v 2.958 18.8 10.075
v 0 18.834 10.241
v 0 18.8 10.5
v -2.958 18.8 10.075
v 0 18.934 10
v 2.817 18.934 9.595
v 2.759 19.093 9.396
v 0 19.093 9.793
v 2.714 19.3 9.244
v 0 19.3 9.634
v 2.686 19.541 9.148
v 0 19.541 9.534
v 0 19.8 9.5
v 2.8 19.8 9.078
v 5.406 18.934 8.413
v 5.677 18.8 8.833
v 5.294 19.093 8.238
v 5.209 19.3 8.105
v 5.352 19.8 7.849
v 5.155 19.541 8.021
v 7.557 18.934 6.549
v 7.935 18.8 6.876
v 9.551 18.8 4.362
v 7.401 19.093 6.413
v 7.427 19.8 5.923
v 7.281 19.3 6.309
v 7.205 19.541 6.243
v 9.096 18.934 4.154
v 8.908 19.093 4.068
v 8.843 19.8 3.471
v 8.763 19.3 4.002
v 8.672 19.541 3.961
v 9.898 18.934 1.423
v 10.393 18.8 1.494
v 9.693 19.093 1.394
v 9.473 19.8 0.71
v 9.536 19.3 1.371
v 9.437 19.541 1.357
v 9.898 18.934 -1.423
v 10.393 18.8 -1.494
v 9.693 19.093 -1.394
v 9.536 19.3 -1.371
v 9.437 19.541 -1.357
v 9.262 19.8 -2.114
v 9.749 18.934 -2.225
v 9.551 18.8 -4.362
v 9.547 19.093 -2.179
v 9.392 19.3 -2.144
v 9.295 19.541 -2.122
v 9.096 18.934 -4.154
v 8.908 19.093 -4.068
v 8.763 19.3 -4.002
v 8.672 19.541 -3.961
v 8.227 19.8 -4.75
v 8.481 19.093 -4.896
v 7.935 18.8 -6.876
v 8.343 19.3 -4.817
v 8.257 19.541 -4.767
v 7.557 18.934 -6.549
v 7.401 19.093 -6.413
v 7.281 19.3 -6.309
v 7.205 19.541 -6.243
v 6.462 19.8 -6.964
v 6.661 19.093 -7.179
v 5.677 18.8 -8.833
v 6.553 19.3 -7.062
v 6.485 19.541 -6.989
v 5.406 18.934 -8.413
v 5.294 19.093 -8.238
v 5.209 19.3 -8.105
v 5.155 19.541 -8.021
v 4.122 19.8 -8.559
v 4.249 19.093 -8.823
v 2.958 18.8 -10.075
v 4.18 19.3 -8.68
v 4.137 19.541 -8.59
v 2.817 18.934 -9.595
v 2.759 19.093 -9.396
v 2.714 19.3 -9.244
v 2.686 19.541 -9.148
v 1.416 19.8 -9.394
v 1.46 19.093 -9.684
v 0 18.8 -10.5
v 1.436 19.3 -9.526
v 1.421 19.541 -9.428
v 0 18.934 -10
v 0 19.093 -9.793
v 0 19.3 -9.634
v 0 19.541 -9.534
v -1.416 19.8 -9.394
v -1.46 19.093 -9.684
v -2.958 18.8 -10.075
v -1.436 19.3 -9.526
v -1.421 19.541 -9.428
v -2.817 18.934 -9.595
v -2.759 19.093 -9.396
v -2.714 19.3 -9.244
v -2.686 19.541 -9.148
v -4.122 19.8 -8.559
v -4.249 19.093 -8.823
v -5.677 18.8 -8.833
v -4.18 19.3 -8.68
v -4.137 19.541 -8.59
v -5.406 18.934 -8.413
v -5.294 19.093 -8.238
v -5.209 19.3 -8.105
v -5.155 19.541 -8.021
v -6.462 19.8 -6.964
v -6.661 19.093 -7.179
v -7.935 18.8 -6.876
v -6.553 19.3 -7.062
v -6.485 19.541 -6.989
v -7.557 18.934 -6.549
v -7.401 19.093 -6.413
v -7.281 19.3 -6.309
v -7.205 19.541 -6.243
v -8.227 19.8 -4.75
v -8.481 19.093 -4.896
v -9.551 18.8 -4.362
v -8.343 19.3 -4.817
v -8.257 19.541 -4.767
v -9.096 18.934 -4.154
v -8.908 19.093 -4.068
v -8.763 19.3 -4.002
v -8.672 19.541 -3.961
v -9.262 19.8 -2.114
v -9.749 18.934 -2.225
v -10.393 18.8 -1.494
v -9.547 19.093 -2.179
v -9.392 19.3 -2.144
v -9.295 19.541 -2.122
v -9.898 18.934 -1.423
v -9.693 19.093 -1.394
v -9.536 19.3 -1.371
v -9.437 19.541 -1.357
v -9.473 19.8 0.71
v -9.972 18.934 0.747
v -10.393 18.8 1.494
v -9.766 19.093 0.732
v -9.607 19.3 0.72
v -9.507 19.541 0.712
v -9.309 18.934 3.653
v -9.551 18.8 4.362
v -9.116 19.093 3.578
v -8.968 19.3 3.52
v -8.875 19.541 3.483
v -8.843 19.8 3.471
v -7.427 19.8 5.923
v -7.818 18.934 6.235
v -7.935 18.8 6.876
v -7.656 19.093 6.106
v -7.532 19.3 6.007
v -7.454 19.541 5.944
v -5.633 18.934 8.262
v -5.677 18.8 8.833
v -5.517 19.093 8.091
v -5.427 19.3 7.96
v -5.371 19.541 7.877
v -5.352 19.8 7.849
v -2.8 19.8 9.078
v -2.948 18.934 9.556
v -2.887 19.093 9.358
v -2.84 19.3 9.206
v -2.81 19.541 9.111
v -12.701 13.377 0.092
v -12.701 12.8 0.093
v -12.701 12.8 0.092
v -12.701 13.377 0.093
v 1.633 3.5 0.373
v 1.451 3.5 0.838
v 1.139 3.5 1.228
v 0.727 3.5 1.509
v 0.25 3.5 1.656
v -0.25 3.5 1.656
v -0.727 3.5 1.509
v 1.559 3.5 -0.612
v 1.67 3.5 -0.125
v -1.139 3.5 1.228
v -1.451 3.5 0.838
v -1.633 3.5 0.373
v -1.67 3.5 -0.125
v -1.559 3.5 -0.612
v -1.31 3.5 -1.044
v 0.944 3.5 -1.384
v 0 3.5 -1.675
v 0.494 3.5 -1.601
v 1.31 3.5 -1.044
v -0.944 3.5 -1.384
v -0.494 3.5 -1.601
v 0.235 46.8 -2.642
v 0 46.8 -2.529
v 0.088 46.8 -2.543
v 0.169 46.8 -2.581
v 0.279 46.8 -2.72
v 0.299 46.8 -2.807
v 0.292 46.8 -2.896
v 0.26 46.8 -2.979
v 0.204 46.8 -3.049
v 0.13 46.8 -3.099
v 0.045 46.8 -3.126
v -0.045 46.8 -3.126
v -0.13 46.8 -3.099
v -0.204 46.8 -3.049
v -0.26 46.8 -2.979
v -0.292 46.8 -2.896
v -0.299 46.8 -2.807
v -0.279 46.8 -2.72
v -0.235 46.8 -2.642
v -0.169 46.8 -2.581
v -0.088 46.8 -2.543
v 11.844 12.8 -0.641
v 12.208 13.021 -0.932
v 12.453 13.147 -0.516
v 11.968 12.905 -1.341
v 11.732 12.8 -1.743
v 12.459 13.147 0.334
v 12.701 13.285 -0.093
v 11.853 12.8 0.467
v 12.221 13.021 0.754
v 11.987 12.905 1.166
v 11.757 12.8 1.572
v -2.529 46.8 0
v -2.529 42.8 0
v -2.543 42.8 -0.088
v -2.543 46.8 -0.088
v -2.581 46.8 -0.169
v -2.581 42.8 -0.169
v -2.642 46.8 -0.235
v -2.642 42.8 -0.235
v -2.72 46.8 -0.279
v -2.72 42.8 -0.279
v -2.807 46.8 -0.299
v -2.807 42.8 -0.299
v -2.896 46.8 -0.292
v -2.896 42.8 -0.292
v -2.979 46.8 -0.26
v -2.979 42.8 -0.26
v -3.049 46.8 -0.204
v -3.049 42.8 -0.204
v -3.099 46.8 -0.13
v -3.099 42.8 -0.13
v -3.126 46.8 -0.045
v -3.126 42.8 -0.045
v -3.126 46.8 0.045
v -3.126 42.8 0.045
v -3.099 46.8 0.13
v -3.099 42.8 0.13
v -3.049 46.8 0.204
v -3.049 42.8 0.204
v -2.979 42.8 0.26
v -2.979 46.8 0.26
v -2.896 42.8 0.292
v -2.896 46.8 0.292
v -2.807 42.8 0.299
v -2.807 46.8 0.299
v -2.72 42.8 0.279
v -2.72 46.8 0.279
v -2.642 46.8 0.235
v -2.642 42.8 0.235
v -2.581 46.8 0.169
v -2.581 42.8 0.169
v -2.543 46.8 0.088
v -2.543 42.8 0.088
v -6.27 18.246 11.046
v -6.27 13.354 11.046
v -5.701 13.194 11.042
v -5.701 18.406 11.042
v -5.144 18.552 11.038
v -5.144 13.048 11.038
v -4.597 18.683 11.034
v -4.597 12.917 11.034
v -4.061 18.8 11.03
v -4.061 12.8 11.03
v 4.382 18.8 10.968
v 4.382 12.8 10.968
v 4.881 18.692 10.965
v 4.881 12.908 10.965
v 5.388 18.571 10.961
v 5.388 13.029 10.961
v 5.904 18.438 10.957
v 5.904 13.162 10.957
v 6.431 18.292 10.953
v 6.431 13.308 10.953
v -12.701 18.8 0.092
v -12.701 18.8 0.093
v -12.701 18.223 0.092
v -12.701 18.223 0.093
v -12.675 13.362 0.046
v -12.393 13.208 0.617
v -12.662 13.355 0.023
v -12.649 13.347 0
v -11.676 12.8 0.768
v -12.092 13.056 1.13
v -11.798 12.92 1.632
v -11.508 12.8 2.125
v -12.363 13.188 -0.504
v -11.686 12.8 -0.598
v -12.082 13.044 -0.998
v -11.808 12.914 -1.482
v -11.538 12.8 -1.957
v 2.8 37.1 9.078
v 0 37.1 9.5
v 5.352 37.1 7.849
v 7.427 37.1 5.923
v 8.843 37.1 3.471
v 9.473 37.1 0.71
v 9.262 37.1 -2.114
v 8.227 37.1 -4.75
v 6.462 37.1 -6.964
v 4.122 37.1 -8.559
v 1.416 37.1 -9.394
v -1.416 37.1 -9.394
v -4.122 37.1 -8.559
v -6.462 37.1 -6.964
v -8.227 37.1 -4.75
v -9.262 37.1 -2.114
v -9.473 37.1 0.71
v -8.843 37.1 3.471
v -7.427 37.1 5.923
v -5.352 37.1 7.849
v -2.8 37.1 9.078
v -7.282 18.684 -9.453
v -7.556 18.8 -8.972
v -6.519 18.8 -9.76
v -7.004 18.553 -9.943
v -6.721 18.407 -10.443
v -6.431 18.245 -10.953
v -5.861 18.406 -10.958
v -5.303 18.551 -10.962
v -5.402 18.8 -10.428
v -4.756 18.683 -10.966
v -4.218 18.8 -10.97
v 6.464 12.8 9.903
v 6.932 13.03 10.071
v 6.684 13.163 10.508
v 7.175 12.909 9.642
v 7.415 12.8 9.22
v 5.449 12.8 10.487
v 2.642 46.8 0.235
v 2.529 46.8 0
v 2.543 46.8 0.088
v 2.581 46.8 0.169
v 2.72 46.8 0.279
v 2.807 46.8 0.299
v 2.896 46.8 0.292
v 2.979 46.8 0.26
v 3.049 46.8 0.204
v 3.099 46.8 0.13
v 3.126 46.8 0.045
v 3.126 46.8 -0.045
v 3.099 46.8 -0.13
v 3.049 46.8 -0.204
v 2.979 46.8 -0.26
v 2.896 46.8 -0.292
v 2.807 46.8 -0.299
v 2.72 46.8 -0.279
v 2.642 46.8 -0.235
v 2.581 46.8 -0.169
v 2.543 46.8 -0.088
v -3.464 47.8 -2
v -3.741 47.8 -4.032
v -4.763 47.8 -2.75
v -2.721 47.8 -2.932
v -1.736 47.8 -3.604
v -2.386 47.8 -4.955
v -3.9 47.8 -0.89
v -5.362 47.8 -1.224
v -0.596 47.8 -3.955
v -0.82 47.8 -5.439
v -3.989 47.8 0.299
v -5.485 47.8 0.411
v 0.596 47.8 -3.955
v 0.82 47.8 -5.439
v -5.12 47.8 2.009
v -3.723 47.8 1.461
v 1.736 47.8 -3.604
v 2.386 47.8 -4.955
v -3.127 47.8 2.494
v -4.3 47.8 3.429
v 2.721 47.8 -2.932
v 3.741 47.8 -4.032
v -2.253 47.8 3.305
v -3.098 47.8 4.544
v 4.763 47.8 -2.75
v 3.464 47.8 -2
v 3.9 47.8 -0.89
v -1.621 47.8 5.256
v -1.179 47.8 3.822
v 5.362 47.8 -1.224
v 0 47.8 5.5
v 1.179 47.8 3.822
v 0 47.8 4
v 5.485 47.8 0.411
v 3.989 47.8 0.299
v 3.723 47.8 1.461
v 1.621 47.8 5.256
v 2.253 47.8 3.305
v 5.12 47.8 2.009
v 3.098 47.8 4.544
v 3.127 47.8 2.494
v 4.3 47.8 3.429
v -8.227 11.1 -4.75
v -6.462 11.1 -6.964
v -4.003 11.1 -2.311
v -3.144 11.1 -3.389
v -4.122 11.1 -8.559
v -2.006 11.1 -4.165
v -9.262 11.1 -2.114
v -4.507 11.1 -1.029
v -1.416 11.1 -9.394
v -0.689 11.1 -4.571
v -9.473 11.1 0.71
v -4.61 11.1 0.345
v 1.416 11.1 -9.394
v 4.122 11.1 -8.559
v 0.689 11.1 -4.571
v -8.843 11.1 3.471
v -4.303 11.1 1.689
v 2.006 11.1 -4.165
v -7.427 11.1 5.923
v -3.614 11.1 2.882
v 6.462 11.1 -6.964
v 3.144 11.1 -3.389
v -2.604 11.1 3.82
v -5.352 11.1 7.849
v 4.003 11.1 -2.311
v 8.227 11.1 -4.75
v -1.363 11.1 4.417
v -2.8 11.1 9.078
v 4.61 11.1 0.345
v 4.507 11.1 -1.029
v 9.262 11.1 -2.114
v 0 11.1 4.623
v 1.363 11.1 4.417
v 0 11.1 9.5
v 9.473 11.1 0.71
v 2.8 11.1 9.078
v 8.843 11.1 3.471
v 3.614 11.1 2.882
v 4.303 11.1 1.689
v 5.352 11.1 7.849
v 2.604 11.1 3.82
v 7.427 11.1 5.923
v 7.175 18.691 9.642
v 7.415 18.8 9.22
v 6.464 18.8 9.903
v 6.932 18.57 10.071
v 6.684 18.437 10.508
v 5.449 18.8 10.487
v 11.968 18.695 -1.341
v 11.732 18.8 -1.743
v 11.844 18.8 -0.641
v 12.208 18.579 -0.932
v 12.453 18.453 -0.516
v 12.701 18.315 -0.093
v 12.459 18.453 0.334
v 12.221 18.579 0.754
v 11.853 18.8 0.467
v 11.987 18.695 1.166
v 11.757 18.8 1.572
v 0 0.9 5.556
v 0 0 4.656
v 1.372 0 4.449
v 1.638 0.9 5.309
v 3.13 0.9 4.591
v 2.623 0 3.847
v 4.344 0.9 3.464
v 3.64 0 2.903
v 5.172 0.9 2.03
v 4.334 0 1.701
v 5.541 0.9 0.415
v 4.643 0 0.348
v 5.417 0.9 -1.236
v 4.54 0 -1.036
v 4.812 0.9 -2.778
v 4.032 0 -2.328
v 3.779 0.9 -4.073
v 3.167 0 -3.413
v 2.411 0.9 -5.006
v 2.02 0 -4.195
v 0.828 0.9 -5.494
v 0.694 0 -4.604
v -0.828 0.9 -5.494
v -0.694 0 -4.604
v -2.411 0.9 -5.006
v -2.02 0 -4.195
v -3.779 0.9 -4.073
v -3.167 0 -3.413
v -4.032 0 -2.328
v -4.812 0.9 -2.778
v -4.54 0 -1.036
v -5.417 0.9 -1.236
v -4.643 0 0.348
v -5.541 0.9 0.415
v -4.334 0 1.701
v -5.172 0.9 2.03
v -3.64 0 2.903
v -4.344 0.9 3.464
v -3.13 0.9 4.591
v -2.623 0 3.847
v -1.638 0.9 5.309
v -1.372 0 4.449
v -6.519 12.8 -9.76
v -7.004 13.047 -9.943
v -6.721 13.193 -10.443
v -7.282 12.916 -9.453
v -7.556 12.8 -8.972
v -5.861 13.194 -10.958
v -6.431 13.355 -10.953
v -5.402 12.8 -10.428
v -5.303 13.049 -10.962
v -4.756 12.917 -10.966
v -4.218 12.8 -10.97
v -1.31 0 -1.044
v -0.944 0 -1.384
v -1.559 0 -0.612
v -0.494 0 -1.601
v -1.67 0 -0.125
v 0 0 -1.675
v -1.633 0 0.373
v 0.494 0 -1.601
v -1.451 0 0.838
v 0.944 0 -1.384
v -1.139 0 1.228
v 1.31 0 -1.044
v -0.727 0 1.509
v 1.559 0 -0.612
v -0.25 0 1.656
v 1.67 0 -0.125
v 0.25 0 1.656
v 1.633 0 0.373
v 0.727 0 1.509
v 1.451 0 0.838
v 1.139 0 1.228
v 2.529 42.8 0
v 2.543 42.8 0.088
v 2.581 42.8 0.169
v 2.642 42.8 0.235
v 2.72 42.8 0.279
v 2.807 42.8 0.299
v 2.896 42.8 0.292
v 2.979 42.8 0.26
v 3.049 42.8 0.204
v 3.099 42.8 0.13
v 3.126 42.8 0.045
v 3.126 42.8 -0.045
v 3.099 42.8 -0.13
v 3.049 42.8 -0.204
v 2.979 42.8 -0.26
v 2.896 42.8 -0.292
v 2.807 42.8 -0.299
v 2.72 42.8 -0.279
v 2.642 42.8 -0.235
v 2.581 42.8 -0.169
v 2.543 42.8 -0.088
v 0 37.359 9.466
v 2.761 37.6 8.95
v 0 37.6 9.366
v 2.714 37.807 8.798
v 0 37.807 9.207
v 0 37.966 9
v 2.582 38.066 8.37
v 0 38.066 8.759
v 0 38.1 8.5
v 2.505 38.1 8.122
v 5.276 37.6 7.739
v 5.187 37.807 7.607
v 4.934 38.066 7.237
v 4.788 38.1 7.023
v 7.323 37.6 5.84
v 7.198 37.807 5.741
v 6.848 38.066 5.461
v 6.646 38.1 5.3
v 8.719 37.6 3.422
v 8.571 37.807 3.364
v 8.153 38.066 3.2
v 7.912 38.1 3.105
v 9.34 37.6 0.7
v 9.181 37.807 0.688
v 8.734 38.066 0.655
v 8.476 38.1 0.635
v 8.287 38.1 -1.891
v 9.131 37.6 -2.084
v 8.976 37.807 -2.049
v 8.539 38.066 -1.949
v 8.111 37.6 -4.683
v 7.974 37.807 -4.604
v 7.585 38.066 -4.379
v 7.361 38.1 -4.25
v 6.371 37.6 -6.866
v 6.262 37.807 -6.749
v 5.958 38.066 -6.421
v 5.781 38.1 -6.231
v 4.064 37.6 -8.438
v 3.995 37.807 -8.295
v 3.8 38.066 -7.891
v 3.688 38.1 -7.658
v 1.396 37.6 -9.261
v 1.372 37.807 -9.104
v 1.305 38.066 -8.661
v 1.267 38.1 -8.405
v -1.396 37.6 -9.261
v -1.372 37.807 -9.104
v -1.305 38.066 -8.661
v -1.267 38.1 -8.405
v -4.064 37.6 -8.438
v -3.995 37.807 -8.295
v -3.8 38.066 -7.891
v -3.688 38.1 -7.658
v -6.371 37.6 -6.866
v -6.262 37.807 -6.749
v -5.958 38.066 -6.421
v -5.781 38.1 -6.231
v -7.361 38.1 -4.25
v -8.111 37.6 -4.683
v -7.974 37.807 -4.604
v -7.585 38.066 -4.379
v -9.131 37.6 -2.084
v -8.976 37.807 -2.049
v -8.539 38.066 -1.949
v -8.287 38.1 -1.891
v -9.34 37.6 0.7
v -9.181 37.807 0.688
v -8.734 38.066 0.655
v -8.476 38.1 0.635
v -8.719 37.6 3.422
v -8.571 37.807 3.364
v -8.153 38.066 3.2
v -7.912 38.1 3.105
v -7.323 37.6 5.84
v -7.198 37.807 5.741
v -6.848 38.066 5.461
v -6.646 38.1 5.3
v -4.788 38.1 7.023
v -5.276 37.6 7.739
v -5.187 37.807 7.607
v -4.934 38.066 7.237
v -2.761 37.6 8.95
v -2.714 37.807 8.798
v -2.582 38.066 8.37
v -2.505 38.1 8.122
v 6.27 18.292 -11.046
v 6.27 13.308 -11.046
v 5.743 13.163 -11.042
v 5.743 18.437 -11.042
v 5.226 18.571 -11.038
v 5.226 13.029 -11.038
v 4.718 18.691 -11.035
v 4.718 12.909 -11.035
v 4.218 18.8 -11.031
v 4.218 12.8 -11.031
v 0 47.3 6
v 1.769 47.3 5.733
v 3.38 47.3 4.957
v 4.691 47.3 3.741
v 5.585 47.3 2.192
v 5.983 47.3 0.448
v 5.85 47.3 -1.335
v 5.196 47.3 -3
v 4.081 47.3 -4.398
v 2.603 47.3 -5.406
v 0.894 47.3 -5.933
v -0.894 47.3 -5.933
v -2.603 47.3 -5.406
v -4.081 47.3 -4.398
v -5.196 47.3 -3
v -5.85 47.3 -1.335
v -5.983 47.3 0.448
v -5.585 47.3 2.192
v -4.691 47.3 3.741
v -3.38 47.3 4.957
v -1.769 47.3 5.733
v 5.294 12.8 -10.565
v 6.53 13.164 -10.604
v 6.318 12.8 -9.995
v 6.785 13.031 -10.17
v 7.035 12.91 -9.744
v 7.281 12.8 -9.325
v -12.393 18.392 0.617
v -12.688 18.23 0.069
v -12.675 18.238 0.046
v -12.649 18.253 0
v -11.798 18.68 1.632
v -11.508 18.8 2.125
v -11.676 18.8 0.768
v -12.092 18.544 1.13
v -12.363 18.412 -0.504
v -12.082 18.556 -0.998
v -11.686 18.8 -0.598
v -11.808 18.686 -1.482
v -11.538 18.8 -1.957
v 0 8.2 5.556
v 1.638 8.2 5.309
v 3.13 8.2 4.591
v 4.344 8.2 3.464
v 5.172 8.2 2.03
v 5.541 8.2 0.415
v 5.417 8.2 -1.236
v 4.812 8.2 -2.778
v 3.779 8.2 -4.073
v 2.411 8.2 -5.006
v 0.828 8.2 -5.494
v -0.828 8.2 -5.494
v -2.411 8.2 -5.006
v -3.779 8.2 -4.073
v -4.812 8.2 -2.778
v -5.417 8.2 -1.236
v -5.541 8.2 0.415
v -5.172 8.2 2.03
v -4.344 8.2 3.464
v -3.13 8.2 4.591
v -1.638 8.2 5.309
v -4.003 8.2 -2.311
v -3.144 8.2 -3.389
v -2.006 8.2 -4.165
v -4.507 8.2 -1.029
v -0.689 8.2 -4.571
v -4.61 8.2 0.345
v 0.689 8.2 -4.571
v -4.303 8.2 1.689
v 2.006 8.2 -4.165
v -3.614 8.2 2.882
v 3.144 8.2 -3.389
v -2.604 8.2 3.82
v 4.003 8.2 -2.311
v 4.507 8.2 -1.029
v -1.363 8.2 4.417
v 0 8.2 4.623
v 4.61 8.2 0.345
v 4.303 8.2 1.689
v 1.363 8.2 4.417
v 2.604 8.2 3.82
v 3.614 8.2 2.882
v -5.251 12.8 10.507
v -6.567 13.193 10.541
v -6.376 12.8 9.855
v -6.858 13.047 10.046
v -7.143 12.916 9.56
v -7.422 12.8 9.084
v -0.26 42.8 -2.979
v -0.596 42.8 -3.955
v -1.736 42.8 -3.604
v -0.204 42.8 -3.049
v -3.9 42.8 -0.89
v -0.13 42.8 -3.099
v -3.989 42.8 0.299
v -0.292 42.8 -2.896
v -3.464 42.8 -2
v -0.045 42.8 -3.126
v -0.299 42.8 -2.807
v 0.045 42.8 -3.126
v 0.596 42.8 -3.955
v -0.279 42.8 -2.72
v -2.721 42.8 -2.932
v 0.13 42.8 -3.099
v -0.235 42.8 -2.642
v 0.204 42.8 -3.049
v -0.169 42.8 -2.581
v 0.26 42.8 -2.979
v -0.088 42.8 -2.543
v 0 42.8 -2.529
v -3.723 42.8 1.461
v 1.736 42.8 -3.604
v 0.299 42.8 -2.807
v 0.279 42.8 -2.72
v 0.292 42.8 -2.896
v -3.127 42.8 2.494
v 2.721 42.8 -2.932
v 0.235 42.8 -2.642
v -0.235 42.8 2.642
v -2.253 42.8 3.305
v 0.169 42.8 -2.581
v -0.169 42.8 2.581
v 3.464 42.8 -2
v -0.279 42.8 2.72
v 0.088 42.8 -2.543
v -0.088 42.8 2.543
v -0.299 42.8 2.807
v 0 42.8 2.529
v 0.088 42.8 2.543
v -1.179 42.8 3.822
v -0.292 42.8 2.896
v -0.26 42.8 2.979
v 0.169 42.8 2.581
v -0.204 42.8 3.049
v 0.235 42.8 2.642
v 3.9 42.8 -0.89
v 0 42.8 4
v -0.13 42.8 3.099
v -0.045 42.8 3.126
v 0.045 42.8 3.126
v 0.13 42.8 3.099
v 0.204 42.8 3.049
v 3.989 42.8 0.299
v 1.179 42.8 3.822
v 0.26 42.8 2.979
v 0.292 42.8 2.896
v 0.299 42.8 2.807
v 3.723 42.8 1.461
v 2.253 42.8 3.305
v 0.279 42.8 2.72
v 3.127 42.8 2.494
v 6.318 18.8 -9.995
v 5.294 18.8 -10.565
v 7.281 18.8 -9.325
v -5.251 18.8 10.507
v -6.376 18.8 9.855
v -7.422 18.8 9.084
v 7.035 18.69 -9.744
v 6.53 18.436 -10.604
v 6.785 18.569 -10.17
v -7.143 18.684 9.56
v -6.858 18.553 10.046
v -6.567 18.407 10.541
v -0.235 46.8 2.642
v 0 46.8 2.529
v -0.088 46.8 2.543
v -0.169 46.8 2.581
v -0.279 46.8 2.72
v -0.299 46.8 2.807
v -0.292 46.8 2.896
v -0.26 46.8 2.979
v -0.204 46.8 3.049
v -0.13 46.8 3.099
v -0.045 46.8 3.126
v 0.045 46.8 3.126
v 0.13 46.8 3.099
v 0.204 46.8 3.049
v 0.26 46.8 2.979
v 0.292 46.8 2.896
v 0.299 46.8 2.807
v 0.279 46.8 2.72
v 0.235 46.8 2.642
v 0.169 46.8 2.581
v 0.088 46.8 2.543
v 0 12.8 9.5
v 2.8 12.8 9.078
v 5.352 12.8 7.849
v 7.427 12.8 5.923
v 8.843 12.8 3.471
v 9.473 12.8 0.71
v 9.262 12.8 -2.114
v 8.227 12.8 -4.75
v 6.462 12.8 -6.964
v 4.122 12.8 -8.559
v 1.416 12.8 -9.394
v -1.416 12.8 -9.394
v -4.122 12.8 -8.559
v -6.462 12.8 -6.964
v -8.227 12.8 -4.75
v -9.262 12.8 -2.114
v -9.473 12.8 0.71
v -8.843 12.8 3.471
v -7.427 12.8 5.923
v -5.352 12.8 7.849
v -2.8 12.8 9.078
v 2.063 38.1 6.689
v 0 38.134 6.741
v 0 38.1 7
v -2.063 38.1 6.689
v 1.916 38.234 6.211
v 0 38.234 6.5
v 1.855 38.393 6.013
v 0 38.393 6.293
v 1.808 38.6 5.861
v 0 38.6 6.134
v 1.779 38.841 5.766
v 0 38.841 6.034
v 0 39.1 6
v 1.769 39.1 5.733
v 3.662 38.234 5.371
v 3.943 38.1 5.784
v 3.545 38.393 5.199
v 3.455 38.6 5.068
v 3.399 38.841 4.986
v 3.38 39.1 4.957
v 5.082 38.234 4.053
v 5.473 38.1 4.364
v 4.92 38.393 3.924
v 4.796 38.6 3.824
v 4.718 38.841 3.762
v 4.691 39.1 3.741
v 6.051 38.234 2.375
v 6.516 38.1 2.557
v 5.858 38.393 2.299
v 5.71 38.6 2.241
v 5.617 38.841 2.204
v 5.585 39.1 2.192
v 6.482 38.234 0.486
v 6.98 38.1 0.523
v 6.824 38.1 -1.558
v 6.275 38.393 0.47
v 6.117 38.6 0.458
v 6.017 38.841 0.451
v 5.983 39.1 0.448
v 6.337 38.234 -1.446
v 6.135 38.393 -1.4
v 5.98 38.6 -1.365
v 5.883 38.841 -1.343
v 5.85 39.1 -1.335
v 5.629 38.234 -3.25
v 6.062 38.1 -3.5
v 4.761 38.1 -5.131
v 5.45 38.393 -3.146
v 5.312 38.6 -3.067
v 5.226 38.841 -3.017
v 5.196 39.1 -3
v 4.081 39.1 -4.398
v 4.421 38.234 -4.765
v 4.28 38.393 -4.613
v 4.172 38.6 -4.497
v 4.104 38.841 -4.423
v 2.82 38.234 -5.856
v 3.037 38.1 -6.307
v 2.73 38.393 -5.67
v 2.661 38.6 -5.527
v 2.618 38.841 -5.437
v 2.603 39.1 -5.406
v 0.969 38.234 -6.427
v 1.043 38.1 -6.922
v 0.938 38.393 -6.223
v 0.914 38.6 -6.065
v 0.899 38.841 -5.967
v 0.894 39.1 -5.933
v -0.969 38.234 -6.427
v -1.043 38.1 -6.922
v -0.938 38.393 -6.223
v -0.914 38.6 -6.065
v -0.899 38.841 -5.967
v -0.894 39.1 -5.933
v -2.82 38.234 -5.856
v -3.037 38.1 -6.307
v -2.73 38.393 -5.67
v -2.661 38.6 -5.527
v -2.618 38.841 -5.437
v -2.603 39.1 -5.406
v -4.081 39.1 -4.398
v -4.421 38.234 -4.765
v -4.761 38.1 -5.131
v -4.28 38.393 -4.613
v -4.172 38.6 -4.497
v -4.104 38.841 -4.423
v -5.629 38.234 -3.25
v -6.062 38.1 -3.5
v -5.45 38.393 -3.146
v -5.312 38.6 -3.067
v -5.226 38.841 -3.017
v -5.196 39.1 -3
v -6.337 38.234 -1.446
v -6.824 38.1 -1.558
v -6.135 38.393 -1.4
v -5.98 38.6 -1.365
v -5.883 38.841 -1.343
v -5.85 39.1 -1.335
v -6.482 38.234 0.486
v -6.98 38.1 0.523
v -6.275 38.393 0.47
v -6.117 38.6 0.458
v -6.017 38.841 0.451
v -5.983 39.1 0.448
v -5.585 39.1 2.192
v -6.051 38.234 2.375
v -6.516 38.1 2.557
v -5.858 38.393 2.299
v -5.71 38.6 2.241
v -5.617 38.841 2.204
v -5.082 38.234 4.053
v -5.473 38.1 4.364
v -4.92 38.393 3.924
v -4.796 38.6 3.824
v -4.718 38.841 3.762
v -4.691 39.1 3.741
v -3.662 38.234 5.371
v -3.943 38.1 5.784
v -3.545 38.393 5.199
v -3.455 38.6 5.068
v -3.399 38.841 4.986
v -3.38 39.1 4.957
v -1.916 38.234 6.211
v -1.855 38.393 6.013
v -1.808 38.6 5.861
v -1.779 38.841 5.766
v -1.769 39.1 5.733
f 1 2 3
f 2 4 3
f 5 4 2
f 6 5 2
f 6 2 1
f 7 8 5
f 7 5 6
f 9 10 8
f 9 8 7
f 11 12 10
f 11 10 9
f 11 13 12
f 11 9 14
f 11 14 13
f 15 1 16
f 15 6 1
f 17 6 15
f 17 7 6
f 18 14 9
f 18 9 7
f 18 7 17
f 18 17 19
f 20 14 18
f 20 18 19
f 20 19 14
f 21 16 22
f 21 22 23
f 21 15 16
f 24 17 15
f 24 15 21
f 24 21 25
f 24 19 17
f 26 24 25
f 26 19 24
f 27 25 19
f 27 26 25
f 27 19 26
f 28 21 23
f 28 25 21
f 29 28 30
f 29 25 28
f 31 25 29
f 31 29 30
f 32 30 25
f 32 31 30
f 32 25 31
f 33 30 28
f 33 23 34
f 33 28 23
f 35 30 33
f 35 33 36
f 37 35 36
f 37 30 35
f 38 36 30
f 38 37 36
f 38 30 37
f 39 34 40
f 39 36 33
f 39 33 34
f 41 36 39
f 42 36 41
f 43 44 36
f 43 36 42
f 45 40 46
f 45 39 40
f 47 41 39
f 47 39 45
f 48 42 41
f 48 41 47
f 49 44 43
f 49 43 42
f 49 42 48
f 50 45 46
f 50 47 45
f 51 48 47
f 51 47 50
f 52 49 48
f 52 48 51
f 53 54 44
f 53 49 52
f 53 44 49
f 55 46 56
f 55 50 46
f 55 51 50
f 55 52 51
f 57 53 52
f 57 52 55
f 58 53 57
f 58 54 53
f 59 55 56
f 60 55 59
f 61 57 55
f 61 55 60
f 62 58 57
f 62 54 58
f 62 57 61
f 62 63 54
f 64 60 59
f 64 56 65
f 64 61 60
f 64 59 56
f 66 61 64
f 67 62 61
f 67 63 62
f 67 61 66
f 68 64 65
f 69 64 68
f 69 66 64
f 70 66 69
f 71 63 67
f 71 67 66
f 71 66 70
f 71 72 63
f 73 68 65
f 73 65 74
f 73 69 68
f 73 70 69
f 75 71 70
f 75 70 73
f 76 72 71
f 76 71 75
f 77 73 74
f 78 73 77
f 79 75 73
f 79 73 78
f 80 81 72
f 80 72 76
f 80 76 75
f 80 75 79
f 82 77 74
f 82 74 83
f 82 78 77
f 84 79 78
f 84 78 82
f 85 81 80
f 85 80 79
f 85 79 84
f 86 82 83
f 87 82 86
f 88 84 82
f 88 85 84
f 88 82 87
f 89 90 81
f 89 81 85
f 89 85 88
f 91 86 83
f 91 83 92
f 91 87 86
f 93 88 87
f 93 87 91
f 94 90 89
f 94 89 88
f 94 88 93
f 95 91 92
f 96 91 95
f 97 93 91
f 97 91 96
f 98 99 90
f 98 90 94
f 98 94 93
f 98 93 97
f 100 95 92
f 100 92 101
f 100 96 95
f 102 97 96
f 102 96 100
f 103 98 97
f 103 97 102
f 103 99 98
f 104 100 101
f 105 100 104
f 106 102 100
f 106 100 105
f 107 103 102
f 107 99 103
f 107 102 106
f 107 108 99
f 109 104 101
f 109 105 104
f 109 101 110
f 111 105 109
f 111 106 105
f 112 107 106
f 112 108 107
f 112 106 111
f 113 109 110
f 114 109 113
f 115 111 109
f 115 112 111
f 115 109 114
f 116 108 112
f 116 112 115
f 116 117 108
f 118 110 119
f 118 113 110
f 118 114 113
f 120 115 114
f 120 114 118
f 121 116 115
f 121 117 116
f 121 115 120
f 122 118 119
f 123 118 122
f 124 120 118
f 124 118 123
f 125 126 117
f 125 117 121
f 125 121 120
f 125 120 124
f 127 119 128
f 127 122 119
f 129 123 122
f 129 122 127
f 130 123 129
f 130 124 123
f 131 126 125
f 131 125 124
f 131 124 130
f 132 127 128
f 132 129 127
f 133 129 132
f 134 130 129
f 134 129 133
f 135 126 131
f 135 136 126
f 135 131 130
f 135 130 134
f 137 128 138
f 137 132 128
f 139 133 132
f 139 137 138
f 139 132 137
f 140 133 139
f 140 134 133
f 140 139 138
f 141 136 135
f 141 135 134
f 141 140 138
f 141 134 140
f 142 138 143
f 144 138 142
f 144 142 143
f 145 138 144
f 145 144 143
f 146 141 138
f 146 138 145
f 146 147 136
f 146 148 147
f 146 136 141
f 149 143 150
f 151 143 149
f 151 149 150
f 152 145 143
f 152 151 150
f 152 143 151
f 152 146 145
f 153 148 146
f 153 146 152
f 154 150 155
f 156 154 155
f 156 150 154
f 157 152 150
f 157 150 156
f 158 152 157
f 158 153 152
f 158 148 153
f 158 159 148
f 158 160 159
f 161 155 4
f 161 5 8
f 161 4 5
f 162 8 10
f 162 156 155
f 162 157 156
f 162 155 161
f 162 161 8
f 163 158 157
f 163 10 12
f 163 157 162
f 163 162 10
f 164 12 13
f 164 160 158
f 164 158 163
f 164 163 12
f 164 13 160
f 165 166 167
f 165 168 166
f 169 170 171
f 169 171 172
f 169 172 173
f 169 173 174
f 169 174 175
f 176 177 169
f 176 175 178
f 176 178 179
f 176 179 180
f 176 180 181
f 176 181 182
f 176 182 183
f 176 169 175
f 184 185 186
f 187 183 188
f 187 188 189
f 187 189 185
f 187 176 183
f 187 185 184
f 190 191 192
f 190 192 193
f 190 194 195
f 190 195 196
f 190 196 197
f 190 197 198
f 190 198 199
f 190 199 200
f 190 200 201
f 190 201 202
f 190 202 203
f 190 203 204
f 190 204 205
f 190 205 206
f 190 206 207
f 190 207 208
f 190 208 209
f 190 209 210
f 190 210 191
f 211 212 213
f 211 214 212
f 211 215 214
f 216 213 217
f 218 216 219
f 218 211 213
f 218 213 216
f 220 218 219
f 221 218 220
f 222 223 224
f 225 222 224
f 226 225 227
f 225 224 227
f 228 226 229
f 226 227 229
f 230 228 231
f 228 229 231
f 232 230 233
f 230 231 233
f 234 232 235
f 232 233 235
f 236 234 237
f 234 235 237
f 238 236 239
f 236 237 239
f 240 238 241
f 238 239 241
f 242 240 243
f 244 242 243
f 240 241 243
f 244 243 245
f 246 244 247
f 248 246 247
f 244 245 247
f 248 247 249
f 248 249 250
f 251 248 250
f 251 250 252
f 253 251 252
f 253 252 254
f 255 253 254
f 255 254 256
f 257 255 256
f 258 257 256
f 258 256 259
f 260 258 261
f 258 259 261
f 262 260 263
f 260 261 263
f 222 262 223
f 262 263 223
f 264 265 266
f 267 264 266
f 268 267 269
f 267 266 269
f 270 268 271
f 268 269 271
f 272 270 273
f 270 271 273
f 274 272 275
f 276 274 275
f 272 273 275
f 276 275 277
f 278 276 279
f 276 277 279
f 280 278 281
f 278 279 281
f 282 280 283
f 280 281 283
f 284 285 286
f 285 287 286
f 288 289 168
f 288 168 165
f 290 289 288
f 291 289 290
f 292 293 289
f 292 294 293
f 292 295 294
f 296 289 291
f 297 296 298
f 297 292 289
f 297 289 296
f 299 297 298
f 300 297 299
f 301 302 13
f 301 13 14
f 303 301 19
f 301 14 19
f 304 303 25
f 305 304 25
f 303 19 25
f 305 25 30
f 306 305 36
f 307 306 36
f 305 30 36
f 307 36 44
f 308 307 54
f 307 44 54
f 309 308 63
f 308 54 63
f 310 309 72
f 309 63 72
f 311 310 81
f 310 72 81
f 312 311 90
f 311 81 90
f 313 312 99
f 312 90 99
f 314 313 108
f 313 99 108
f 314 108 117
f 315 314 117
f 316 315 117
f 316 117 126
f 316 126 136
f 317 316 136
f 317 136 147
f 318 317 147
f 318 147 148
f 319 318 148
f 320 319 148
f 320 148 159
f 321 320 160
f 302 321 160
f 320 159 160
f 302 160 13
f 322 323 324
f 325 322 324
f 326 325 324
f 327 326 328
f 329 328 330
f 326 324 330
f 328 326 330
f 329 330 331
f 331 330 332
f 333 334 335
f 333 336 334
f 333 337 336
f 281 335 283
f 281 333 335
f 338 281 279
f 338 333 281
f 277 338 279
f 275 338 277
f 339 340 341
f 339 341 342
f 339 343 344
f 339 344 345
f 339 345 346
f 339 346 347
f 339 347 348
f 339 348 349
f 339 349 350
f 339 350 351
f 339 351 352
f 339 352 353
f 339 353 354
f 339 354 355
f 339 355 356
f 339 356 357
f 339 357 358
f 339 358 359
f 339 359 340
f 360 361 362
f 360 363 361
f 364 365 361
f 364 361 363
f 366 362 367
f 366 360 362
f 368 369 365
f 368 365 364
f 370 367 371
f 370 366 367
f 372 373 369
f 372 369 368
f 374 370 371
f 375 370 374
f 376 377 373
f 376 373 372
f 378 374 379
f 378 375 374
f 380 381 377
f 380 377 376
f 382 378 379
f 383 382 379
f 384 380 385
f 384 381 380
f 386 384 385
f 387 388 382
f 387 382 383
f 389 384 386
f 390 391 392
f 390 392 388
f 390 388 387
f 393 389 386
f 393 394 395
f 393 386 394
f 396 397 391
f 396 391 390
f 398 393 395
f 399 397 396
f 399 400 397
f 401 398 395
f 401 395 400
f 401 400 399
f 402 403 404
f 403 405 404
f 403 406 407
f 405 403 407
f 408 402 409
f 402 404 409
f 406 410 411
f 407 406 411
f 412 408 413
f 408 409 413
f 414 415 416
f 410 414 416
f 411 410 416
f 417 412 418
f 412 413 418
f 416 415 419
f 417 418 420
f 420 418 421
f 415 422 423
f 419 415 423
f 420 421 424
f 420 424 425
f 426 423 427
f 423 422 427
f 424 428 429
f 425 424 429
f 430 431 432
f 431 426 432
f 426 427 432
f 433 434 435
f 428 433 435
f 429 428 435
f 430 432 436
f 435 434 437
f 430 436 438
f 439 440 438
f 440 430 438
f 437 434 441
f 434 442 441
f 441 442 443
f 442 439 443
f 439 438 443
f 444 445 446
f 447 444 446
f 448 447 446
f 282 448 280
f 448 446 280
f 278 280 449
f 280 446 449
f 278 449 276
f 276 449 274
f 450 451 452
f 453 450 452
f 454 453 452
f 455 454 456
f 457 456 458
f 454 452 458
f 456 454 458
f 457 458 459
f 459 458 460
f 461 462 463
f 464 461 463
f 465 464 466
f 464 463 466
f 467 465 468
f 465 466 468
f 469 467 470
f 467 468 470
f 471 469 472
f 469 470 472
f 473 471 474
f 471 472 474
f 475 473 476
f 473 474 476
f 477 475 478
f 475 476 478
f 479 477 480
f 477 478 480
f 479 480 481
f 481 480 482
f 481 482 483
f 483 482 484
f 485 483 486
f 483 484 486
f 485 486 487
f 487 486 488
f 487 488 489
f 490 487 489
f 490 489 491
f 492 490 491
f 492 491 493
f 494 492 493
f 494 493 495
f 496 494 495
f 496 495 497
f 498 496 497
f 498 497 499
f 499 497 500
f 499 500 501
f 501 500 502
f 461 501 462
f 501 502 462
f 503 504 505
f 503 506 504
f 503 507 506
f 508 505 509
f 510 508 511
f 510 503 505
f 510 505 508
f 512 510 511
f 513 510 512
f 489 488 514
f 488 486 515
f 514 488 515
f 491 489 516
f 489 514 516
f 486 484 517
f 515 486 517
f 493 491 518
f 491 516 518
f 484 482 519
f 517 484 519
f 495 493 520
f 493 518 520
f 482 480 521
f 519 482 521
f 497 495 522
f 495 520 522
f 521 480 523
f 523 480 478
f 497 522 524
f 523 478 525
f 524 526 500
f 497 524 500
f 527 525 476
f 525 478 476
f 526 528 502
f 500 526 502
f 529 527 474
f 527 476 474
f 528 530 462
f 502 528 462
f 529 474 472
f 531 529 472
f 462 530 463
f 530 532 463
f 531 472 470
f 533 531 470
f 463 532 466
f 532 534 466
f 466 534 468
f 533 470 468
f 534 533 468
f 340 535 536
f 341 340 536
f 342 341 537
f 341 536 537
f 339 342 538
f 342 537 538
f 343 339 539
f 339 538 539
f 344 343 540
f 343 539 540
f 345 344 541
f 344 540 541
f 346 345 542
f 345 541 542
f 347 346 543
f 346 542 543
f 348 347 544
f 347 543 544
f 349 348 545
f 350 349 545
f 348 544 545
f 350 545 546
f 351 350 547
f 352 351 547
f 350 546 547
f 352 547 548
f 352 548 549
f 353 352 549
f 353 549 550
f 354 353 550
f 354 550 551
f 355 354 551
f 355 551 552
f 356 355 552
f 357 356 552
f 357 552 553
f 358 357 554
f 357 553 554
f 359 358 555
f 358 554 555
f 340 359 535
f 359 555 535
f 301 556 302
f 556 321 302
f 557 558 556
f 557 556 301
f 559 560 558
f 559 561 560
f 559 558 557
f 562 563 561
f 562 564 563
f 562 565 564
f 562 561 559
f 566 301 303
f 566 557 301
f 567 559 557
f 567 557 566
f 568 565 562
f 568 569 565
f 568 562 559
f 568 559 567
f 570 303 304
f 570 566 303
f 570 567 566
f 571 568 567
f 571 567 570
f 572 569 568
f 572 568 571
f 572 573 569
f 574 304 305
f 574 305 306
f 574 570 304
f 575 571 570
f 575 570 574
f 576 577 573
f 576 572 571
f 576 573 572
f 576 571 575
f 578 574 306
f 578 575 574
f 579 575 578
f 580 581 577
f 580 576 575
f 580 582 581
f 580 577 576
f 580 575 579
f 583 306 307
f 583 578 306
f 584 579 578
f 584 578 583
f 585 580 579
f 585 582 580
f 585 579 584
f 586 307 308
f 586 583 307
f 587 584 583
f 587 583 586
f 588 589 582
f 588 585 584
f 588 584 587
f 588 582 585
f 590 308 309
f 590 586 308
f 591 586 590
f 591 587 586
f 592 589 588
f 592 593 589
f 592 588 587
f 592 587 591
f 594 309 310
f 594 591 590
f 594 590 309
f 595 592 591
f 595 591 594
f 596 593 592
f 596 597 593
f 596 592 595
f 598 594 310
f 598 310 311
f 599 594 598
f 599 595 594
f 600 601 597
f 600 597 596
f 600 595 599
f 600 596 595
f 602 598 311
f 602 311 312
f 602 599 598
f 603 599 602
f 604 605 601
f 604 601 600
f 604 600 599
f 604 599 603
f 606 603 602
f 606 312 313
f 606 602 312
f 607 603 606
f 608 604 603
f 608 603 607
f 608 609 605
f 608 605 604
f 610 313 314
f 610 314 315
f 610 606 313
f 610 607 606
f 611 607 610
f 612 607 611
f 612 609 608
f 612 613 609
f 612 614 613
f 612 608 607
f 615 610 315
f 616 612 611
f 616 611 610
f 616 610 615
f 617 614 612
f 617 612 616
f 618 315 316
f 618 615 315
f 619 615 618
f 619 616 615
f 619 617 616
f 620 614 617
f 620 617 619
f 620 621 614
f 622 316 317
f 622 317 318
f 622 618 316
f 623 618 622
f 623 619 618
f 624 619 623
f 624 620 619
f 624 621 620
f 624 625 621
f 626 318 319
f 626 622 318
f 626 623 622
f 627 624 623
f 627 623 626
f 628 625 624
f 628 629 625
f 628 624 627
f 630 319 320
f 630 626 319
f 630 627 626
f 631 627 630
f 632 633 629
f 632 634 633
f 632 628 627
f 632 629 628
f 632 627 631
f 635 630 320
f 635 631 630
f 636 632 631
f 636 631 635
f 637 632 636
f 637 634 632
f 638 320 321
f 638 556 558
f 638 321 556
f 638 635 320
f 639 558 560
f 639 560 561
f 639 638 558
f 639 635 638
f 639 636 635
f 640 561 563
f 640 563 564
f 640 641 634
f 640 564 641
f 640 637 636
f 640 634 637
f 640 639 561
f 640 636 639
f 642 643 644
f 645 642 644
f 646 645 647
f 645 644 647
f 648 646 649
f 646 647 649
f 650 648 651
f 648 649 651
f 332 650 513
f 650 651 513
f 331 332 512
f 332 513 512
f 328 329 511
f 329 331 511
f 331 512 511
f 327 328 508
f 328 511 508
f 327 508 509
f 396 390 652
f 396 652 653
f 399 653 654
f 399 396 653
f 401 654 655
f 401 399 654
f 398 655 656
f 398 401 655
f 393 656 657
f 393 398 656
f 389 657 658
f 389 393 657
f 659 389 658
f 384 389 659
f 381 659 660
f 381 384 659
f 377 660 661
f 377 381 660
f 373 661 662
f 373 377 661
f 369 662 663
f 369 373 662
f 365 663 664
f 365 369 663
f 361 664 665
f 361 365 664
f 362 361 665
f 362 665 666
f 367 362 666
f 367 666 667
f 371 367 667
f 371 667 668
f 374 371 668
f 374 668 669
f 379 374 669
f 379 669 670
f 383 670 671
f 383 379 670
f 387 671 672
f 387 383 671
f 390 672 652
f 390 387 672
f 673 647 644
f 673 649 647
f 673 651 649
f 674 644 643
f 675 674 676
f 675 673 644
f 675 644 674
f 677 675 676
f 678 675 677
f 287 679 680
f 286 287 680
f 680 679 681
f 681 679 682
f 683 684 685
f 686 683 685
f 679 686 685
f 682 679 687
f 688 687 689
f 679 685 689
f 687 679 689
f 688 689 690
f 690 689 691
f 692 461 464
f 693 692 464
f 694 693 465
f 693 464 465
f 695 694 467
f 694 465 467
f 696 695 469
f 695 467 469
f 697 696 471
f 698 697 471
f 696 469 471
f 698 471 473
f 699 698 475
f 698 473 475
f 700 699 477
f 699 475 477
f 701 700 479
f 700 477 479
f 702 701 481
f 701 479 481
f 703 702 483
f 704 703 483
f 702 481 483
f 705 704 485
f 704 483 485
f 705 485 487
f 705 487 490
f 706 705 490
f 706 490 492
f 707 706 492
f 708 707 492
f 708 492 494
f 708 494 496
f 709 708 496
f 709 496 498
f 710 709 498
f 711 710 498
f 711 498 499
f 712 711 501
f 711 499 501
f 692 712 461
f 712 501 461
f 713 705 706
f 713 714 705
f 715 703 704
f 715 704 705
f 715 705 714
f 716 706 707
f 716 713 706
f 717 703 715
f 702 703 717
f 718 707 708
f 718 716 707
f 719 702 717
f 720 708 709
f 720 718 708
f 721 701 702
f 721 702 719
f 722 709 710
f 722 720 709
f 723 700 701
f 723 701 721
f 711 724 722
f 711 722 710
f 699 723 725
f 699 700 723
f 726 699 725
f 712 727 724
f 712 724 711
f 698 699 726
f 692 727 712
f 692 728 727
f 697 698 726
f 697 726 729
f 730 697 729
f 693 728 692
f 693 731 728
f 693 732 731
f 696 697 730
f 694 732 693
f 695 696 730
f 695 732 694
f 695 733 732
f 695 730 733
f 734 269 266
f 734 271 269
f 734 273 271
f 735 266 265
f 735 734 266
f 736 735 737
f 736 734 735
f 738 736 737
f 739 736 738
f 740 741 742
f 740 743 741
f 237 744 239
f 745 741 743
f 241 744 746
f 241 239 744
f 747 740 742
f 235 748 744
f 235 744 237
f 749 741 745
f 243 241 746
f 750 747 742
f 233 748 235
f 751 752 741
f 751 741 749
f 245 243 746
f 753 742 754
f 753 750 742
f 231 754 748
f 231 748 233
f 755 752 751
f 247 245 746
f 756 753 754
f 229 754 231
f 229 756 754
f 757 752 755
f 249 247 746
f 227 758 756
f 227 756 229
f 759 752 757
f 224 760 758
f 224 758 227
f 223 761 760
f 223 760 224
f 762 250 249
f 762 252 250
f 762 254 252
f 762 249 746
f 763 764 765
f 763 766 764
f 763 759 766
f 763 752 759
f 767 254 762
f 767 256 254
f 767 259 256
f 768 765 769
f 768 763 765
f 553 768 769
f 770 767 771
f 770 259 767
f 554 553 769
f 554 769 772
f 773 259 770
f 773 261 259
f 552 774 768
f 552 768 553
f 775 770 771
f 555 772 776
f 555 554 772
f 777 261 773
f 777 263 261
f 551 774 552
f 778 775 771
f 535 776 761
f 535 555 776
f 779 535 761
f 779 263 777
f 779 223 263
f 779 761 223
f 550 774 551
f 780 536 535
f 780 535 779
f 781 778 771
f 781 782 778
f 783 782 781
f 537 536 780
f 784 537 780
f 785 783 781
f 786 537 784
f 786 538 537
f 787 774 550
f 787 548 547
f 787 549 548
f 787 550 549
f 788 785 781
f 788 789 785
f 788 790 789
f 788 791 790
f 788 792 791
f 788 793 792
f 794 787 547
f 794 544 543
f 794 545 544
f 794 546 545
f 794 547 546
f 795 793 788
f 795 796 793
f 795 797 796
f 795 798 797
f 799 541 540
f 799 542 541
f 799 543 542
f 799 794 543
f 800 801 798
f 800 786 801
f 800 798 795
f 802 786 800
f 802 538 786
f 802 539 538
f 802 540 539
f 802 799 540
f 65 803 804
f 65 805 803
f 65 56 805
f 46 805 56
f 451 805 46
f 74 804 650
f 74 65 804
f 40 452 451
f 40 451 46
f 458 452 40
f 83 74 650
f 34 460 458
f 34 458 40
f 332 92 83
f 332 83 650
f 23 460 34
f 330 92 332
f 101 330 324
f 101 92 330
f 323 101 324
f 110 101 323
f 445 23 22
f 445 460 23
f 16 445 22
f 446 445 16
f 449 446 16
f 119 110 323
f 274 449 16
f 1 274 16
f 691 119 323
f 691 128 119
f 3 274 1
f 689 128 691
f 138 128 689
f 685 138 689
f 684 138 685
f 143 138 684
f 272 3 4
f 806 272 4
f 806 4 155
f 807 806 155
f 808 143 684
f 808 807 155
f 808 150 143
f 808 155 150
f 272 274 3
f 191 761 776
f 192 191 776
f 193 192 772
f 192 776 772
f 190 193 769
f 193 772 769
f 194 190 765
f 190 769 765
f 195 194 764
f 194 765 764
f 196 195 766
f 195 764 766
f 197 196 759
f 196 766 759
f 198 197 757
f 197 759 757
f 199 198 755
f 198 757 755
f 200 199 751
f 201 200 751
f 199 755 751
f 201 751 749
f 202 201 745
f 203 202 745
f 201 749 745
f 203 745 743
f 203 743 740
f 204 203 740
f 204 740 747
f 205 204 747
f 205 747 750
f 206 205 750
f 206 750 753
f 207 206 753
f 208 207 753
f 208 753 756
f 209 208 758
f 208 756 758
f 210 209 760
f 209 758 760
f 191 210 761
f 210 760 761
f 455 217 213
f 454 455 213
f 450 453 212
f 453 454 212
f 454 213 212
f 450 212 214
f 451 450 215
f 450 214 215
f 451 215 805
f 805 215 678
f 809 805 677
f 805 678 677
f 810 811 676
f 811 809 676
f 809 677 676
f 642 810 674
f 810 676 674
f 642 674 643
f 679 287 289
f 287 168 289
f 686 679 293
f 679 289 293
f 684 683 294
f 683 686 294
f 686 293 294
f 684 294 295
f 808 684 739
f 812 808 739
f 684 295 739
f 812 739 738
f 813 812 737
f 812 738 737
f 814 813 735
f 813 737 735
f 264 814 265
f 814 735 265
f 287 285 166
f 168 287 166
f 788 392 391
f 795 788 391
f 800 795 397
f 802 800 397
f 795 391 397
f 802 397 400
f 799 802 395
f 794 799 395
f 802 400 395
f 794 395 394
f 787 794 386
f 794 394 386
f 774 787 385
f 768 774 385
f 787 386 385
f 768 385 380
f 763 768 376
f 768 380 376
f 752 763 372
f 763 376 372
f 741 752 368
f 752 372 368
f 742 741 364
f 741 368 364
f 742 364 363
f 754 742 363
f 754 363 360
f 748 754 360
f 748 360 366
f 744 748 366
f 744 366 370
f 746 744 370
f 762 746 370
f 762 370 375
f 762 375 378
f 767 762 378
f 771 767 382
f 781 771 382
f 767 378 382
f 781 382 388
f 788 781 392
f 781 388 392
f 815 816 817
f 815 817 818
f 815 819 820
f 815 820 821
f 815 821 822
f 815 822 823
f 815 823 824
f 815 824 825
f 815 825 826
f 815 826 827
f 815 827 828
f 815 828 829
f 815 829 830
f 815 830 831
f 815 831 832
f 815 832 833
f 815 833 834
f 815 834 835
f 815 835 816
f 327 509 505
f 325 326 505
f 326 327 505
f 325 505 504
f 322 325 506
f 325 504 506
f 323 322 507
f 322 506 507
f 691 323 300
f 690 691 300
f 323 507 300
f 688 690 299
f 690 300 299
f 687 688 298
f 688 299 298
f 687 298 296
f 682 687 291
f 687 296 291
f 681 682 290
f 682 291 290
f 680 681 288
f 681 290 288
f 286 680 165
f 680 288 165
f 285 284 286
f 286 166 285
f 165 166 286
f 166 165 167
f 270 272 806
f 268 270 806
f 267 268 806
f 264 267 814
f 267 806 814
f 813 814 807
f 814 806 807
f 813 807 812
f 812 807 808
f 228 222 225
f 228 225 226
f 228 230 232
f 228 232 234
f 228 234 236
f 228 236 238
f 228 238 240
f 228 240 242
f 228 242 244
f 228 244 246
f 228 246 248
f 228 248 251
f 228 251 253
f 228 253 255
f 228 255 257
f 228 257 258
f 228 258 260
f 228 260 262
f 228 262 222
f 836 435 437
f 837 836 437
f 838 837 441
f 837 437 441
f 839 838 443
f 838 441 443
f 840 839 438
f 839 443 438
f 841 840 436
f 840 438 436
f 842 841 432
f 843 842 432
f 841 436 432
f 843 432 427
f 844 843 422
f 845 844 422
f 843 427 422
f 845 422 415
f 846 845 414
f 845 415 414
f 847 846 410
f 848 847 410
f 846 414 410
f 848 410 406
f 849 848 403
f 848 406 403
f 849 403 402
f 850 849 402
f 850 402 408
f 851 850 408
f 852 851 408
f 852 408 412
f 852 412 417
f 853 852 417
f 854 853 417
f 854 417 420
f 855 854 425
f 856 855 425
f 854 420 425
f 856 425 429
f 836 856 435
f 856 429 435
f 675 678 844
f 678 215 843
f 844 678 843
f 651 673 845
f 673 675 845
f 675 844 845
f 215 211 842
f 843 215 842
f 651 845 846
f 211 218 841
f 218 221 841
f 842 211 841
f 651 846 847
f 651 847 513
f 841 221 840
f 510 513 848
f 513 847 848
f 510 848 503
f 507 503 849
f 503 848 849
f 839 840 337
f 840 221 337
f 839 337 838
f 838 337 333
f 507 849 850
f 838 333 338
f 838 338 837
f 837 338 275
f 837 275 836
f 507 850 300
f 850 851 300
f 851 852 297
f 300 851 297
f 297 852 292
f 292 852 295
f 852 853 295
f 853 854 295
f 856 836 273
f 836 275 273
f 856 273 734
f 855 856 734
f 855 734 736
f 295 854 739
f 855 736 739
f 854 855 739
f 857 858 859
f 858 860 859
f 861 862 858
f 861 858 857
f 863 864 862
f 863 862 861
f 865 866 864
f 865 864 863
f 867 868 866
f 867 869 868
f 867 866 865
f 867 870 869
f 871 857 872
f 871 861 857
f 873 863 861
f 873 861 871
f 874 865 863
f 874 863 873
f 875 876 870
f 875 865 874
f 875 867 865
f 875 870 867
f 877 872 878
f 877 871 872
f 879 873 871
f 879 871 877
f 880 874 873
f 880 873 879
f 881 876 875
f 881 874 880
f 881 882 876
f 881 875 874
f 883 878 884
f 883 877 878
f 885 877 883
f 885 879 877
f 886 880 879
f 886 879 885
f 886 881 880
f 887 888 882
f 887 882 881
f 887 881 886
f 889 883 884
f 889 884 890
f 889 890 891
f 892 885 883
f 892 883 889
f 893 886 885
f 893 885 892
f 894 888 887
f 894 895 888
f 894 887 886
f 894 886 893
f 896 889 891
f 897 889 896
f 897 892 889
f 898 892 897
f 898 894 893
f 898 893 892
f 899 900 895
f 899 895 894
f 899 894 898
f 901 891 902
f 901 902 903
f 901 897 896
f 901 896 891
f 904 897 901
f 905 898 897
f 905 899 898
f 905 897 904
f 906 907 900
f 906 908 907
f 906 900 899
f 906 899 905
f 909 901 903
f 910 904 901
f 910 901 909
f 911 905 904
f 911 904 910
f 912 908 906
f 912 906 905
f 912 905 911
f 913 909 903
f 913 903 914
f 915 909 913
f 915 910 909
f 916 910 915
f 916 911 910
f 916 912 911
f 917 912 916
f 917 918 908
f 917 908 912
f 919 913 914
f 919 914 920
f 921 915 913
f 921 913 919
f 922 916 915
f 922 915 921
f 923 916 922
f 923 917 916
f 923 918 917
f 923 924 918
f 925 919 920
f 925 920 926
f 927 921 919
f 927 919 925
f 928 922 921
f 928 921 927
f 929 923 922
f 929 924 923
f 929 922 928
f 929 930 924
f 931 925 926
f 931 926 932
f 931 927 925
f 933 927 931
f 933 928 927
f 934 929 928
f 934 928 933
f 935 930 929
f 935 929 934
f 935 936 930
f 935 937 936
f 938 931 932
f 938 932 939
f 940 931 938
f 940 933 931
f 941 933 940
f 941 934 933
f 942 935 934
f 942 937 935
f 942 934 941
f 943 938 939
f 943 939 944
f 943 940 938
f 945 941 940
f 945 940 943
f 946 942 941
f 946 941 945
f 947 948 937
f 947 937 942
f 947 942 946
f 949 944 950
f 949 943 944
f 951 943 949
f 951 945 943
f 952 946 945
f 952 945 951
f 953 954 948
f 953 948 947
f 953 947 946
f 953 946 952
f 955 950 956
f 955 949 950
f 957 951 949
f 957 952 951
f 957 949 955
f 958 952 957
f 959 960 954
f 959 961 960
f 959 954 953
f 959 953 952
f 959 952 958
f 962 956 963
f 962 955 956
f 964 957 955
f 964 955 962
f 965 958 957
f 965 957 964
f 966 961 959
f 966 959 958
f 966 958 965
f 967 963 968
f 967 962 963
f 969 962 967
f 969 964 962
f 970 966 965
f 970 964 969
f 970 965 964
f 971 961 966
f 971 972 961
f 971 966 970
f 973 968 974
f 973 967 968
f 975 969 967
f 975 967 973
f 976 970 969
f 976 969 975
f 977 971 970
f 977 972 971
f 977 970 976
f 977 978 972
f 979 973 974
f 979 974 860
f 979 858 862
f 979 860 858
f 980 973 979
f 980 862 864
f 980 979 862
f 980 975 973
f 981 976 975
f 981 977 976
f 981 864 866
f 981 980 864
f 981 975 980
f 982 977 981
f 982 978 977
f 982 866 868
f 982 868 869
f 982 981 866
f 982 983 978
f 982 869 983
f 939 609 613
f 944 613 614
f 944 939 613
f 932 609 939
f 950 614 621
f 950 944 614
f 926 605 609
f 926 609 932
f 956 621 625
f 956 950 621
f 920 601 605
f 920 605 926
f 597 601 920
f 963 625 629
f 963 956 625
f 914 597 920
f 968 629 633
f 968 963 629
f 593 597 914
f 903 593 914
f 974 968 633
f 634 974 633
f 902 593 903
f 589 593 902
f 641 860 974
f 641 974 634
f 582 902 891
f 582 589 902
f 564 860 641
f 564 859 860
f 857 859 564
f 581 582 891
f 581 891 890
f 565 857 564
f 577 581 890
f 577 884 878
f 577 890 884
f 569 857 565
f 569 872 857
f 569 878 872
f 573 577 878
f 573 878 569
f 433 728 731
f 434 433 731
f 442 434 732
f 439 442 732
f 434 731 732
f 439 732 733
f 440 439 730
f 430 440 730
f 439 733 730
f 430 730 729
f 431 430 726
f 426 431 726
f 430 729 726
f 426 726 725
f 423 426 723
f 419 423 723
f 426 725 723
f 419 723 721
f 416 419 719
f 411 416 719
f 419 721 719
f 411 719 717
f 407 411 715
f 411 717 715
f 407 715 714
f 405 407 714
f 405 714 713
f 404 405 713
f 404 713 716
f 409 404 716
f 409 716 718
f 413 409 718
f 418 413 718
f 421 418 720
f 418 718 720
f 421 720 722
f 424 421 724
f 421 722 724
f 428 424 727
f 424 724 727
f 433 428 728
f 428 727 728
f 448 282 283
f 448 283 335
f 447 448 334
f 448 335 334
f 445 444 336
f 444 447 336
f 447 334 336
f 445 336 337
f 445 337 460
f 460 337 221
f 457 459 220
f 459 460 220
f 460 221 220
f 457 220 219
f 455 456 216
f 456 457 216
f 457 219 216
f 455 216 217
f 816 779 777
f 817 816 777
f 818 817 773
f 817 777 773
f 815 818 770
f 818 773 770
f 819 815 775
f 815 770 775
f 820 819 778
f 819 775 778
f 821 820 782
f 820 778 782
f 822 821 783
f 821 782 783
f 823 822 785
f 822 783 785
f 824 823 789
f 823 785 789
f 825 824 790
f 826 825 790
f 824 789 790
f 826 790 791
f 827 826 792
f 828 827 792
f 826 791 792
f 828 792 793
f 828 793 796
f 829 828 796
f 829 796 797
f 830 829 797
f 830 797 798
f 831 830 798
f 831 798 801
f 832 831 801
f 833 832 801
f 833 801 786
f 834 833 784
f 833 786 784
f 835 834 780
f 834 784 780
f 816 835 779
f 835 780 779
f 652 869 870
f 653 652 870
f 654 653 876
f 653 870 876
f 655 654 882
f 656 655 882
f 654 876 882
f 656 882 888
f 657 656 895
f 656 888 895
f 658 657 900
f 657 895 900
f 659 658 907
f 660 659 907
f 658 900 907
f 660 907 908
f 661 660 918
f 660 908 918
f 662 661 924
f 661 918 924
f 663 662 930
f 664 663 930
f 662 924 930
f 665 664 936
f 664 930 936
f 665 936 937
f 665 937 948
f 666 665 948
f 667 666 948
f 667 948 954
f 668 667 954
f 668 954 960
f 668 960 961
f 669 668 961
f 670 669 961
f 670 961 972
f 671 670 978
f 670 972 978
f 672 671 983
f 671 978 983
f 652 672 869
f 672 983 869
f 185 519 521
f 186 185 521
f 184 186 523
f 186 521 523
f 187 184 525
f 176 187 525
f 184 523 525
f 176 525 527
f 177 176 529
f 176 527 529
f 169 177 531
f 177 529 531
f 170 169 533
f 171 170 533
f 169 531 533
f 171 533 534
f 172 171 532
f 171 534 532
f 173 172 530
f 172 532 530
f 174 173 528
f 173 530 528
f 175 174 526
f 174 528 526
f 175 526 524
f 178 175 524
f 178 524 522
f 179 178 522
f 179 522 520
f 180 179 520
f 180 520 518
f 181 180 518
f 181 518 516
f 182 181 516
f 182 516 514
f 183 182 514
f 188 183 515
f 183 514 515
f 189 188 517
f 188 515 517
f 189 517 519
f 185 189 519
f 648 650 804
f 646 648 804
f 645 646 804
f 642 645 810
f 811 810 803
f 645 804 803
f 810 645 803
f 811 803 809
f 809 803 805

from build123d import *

# Parameters (mm, degrees)
SKETCH1_R               = 5.55625
EXTRUDE1_DEPTH          = 8.2
SKETCH2_R               = 4.6228
EXTRUDE2_DEPTH          = 2.9
SKETCH17_R              = 9.5
EXTRUDE13_DEPTH         = 1.7
EXTRUDE4_DEPTH          = 6
SKETCH5_R               = 9.5
EXTRUDE5_DEPTH          = 19.3
CHAMFER1_SIZE           = 0.9
FILLET1_R               = 1
SKETCH8_R               = 1.675
CUT_EXTRUDE1_DEPTH      = 4.9022
CUT_EXTRUDE1_DEPTH_BACK = 3.5
SKETCH14_R              = 6
EXTRUDE11_DEPTH         = 9.7
FILLET2_R               = 1
CHAMFER3_SIZE           = 0.5
SKETCH15_R              = 4
CUT_EXTRUDE2_DEPTH      = 5
SKETCH16_R              = 0.3
EXTRUDE12_DEPTH         = 4
CIRPATTERN1_COUNT       = 4


with BuildPart() as part:
    # Sketch1 → Extrude1 (new body)
    with BuildSketch(Plane(origin=(0, 0, 0), x_dir=(1, 0, 0), z_dir=(0, 1, 0))):
        with Locations(Location((0, 0, 0), (0, 0, 270))):  # turned: the seam where the file's is
            Circle(SKETCH1_R)
    extrude(amount=EXTRUDE1_DEPTH)

    # Sketch2 → Extrude2 (add)
    with BuildSketch(Plane(origin=(0, 8.2, 0), x_dir=(-1, 0, 0), z_dir=(0, 1, 0))):
        with Locations(Location((0, 0, 0), (0, 0, 90))):  # turned: the seam where the file's is
            Circle(SKETCH2_R)
    extrude(amount=EXTRUDE2_DEPTH)

    # Sketch17 → Extrude13 (add)
    with BuildSketch(Plane(origin=(0, 11.1, 0), x_dir=(-1, 0, 0), z_dir=(0, 1, 0))):
        with Locations(Location((0, 0, 0), (0, 0, 90))):  # turned: the seam where the file's is
            Circle(SKETCH17_R)
    extrude(amount=EXTRUDE13_DEPTH)

    # Sketch4 → Extrude4 (add)
    with BuildSketch(Plane(origin=(0, 12.8, 0), x_dir=(-1, 0, 0), z_dir=(0, 1, 0))):
        Polygon((12.701367758, 0.092684398), (6.270416836, 11.046049341), (-6.430950923, 10.953364943), (-12.701367758, -0.092684398), (-6.270416836, -11.046049341), (6.430950923, -10.953364943), align=None)
    extrude(amount=EXTRUDE4_DEPTH)

    # Sketch5 → Extrude5 (add)
    with BuildSketch(Plane(origin=(0, 18.8, 0), x_dir=(-1, 0, 0), z_dir=(0, 1, 0))):
        with Locations(Location((0, 0, 0), (0, 0, 90))):  # turned: the seam where the file's is
            Circle(SKETCH5_R)
    extrude(amount=EXTRUDE5_DEPTH)

    # Chamfer1
    chamfer1_edges = [part.edges().sort_by_distance(p)[0] for p in [
        (0, 0, -5.55625),
    ]]
    chamfer(chamfer1_edges, length=CHAMFER1_SIZE)

    # Fillet1
    fillet1_edges = [part.edges().sort_by_distance(p)[0] for p in [
        (0, 18.8, -9.5),
        (0, 38.1, -9.5),
    ]]
    fillet(fillet1_edges, radius=FILLET1_R)

    # Sketch7 → Cut-Revolve1 (revolve, cut)
    with BuildSketch(Plane.XY):
        Polygon((-12.701367758, 18.8), (-12.701367758, 18.222649731), (-11.701367758, 18.8), align=None)
        Polygon((-12.701367758, 12.8), (-12.701367758, 13.377350269), (-11.701367758, 12.8), align=None)
    revolve(axis=Axis((0.080267043, 18.8, 0), (0, -1, 0)), mode=Mode.SUBTRACT)

    # Sketch8 → Cut-Extrude1 (cut, two sides)
    with BuildSketch(Plane.XZ) as cut_extrude1_sk:
        with Locations(Location((0, 0, 0), (0, 0, 270))):  # turned: the seam where the file's is
            Circle(SKETCH8_R)
    extrude(amount=CUT_EXTRUDE1_DEPTH, mode=Mode.SUBTRACT)
    extrude(cut_extrude1_sk.sketch, amount=-CUT_EXTRUDE1_DEPTH_BACK, mode=Mode.SUBTRACT)

    # Sketch14 → Extrude11 (add)
    with BuildSketch(Plane(origin=(0, 38.1, 0), x_dir=(-1, 0, 0), z_dir=(0, 1, 0))):
        with Locations(Location((0, 0, 0), (0, 0, 90))):  # turned: the seam where the file's is
            Circle(SKETCH14_R)
    extrude(amount=EXTRUDE11_DEPTH)

    # Fillet2
    fillet2_edges = [part.edges().sort_by_distance(p)[0] for p in [
        (0, 38.1, -6),
    ]]
    fillet(fillet2_edges, radius=FILLET2_R)

    # Chamfer3
    chamfer3_edges = [part.edges().sort_by_distance(p)[0] for p in [
        (0, 47.8, -6),
    ]]
    chamfer(chamfer3_edges, length=CHAMFER3_SIZE)

    # Sketch15 → Cut-Extrude2 (cut)
    with BuildSketch(Plane(origin=(0, 47.8, 0), x_dir=(-1, 0, 0), z_dir=(0, 1, 0))):
        with Locations(Location((0, 0, 0), (0, 0, 90))):  # turned: the seam where the file's is
            Circle(SKETCH15_R)
    extrude(amount=-CUT_EXTRUDE2_DEPTH, mode=Mode.SUBTRACT)

    # Sketch16 → Extrude12 (add)
    with BuildSketch(Plane(origin=(0, 42.8, 0), x_dir=(-1, 0, 0), z_dir=(0, 1, 0))):
        with Locations(Location((0, -2.829193853, 0), (0, 0, 90))):  # turned: the seam where the file's is
            Circle(SKETCH16_R)
    extrude12 = extrude(amount=EXTRUDE12_DEPTH)

    # CirPattern1: Extrude12 ×4 about axis
    cirpattern1_axis = Axis((0, 0, 0), (0, -1, 0))
    for i in range(1, CIRPATTERN1_COUNT):
        add(extrude12.rotate(cirpattern1_axis, i * 360 / CIRPATTERN1_COUNT))


solid = part.part
